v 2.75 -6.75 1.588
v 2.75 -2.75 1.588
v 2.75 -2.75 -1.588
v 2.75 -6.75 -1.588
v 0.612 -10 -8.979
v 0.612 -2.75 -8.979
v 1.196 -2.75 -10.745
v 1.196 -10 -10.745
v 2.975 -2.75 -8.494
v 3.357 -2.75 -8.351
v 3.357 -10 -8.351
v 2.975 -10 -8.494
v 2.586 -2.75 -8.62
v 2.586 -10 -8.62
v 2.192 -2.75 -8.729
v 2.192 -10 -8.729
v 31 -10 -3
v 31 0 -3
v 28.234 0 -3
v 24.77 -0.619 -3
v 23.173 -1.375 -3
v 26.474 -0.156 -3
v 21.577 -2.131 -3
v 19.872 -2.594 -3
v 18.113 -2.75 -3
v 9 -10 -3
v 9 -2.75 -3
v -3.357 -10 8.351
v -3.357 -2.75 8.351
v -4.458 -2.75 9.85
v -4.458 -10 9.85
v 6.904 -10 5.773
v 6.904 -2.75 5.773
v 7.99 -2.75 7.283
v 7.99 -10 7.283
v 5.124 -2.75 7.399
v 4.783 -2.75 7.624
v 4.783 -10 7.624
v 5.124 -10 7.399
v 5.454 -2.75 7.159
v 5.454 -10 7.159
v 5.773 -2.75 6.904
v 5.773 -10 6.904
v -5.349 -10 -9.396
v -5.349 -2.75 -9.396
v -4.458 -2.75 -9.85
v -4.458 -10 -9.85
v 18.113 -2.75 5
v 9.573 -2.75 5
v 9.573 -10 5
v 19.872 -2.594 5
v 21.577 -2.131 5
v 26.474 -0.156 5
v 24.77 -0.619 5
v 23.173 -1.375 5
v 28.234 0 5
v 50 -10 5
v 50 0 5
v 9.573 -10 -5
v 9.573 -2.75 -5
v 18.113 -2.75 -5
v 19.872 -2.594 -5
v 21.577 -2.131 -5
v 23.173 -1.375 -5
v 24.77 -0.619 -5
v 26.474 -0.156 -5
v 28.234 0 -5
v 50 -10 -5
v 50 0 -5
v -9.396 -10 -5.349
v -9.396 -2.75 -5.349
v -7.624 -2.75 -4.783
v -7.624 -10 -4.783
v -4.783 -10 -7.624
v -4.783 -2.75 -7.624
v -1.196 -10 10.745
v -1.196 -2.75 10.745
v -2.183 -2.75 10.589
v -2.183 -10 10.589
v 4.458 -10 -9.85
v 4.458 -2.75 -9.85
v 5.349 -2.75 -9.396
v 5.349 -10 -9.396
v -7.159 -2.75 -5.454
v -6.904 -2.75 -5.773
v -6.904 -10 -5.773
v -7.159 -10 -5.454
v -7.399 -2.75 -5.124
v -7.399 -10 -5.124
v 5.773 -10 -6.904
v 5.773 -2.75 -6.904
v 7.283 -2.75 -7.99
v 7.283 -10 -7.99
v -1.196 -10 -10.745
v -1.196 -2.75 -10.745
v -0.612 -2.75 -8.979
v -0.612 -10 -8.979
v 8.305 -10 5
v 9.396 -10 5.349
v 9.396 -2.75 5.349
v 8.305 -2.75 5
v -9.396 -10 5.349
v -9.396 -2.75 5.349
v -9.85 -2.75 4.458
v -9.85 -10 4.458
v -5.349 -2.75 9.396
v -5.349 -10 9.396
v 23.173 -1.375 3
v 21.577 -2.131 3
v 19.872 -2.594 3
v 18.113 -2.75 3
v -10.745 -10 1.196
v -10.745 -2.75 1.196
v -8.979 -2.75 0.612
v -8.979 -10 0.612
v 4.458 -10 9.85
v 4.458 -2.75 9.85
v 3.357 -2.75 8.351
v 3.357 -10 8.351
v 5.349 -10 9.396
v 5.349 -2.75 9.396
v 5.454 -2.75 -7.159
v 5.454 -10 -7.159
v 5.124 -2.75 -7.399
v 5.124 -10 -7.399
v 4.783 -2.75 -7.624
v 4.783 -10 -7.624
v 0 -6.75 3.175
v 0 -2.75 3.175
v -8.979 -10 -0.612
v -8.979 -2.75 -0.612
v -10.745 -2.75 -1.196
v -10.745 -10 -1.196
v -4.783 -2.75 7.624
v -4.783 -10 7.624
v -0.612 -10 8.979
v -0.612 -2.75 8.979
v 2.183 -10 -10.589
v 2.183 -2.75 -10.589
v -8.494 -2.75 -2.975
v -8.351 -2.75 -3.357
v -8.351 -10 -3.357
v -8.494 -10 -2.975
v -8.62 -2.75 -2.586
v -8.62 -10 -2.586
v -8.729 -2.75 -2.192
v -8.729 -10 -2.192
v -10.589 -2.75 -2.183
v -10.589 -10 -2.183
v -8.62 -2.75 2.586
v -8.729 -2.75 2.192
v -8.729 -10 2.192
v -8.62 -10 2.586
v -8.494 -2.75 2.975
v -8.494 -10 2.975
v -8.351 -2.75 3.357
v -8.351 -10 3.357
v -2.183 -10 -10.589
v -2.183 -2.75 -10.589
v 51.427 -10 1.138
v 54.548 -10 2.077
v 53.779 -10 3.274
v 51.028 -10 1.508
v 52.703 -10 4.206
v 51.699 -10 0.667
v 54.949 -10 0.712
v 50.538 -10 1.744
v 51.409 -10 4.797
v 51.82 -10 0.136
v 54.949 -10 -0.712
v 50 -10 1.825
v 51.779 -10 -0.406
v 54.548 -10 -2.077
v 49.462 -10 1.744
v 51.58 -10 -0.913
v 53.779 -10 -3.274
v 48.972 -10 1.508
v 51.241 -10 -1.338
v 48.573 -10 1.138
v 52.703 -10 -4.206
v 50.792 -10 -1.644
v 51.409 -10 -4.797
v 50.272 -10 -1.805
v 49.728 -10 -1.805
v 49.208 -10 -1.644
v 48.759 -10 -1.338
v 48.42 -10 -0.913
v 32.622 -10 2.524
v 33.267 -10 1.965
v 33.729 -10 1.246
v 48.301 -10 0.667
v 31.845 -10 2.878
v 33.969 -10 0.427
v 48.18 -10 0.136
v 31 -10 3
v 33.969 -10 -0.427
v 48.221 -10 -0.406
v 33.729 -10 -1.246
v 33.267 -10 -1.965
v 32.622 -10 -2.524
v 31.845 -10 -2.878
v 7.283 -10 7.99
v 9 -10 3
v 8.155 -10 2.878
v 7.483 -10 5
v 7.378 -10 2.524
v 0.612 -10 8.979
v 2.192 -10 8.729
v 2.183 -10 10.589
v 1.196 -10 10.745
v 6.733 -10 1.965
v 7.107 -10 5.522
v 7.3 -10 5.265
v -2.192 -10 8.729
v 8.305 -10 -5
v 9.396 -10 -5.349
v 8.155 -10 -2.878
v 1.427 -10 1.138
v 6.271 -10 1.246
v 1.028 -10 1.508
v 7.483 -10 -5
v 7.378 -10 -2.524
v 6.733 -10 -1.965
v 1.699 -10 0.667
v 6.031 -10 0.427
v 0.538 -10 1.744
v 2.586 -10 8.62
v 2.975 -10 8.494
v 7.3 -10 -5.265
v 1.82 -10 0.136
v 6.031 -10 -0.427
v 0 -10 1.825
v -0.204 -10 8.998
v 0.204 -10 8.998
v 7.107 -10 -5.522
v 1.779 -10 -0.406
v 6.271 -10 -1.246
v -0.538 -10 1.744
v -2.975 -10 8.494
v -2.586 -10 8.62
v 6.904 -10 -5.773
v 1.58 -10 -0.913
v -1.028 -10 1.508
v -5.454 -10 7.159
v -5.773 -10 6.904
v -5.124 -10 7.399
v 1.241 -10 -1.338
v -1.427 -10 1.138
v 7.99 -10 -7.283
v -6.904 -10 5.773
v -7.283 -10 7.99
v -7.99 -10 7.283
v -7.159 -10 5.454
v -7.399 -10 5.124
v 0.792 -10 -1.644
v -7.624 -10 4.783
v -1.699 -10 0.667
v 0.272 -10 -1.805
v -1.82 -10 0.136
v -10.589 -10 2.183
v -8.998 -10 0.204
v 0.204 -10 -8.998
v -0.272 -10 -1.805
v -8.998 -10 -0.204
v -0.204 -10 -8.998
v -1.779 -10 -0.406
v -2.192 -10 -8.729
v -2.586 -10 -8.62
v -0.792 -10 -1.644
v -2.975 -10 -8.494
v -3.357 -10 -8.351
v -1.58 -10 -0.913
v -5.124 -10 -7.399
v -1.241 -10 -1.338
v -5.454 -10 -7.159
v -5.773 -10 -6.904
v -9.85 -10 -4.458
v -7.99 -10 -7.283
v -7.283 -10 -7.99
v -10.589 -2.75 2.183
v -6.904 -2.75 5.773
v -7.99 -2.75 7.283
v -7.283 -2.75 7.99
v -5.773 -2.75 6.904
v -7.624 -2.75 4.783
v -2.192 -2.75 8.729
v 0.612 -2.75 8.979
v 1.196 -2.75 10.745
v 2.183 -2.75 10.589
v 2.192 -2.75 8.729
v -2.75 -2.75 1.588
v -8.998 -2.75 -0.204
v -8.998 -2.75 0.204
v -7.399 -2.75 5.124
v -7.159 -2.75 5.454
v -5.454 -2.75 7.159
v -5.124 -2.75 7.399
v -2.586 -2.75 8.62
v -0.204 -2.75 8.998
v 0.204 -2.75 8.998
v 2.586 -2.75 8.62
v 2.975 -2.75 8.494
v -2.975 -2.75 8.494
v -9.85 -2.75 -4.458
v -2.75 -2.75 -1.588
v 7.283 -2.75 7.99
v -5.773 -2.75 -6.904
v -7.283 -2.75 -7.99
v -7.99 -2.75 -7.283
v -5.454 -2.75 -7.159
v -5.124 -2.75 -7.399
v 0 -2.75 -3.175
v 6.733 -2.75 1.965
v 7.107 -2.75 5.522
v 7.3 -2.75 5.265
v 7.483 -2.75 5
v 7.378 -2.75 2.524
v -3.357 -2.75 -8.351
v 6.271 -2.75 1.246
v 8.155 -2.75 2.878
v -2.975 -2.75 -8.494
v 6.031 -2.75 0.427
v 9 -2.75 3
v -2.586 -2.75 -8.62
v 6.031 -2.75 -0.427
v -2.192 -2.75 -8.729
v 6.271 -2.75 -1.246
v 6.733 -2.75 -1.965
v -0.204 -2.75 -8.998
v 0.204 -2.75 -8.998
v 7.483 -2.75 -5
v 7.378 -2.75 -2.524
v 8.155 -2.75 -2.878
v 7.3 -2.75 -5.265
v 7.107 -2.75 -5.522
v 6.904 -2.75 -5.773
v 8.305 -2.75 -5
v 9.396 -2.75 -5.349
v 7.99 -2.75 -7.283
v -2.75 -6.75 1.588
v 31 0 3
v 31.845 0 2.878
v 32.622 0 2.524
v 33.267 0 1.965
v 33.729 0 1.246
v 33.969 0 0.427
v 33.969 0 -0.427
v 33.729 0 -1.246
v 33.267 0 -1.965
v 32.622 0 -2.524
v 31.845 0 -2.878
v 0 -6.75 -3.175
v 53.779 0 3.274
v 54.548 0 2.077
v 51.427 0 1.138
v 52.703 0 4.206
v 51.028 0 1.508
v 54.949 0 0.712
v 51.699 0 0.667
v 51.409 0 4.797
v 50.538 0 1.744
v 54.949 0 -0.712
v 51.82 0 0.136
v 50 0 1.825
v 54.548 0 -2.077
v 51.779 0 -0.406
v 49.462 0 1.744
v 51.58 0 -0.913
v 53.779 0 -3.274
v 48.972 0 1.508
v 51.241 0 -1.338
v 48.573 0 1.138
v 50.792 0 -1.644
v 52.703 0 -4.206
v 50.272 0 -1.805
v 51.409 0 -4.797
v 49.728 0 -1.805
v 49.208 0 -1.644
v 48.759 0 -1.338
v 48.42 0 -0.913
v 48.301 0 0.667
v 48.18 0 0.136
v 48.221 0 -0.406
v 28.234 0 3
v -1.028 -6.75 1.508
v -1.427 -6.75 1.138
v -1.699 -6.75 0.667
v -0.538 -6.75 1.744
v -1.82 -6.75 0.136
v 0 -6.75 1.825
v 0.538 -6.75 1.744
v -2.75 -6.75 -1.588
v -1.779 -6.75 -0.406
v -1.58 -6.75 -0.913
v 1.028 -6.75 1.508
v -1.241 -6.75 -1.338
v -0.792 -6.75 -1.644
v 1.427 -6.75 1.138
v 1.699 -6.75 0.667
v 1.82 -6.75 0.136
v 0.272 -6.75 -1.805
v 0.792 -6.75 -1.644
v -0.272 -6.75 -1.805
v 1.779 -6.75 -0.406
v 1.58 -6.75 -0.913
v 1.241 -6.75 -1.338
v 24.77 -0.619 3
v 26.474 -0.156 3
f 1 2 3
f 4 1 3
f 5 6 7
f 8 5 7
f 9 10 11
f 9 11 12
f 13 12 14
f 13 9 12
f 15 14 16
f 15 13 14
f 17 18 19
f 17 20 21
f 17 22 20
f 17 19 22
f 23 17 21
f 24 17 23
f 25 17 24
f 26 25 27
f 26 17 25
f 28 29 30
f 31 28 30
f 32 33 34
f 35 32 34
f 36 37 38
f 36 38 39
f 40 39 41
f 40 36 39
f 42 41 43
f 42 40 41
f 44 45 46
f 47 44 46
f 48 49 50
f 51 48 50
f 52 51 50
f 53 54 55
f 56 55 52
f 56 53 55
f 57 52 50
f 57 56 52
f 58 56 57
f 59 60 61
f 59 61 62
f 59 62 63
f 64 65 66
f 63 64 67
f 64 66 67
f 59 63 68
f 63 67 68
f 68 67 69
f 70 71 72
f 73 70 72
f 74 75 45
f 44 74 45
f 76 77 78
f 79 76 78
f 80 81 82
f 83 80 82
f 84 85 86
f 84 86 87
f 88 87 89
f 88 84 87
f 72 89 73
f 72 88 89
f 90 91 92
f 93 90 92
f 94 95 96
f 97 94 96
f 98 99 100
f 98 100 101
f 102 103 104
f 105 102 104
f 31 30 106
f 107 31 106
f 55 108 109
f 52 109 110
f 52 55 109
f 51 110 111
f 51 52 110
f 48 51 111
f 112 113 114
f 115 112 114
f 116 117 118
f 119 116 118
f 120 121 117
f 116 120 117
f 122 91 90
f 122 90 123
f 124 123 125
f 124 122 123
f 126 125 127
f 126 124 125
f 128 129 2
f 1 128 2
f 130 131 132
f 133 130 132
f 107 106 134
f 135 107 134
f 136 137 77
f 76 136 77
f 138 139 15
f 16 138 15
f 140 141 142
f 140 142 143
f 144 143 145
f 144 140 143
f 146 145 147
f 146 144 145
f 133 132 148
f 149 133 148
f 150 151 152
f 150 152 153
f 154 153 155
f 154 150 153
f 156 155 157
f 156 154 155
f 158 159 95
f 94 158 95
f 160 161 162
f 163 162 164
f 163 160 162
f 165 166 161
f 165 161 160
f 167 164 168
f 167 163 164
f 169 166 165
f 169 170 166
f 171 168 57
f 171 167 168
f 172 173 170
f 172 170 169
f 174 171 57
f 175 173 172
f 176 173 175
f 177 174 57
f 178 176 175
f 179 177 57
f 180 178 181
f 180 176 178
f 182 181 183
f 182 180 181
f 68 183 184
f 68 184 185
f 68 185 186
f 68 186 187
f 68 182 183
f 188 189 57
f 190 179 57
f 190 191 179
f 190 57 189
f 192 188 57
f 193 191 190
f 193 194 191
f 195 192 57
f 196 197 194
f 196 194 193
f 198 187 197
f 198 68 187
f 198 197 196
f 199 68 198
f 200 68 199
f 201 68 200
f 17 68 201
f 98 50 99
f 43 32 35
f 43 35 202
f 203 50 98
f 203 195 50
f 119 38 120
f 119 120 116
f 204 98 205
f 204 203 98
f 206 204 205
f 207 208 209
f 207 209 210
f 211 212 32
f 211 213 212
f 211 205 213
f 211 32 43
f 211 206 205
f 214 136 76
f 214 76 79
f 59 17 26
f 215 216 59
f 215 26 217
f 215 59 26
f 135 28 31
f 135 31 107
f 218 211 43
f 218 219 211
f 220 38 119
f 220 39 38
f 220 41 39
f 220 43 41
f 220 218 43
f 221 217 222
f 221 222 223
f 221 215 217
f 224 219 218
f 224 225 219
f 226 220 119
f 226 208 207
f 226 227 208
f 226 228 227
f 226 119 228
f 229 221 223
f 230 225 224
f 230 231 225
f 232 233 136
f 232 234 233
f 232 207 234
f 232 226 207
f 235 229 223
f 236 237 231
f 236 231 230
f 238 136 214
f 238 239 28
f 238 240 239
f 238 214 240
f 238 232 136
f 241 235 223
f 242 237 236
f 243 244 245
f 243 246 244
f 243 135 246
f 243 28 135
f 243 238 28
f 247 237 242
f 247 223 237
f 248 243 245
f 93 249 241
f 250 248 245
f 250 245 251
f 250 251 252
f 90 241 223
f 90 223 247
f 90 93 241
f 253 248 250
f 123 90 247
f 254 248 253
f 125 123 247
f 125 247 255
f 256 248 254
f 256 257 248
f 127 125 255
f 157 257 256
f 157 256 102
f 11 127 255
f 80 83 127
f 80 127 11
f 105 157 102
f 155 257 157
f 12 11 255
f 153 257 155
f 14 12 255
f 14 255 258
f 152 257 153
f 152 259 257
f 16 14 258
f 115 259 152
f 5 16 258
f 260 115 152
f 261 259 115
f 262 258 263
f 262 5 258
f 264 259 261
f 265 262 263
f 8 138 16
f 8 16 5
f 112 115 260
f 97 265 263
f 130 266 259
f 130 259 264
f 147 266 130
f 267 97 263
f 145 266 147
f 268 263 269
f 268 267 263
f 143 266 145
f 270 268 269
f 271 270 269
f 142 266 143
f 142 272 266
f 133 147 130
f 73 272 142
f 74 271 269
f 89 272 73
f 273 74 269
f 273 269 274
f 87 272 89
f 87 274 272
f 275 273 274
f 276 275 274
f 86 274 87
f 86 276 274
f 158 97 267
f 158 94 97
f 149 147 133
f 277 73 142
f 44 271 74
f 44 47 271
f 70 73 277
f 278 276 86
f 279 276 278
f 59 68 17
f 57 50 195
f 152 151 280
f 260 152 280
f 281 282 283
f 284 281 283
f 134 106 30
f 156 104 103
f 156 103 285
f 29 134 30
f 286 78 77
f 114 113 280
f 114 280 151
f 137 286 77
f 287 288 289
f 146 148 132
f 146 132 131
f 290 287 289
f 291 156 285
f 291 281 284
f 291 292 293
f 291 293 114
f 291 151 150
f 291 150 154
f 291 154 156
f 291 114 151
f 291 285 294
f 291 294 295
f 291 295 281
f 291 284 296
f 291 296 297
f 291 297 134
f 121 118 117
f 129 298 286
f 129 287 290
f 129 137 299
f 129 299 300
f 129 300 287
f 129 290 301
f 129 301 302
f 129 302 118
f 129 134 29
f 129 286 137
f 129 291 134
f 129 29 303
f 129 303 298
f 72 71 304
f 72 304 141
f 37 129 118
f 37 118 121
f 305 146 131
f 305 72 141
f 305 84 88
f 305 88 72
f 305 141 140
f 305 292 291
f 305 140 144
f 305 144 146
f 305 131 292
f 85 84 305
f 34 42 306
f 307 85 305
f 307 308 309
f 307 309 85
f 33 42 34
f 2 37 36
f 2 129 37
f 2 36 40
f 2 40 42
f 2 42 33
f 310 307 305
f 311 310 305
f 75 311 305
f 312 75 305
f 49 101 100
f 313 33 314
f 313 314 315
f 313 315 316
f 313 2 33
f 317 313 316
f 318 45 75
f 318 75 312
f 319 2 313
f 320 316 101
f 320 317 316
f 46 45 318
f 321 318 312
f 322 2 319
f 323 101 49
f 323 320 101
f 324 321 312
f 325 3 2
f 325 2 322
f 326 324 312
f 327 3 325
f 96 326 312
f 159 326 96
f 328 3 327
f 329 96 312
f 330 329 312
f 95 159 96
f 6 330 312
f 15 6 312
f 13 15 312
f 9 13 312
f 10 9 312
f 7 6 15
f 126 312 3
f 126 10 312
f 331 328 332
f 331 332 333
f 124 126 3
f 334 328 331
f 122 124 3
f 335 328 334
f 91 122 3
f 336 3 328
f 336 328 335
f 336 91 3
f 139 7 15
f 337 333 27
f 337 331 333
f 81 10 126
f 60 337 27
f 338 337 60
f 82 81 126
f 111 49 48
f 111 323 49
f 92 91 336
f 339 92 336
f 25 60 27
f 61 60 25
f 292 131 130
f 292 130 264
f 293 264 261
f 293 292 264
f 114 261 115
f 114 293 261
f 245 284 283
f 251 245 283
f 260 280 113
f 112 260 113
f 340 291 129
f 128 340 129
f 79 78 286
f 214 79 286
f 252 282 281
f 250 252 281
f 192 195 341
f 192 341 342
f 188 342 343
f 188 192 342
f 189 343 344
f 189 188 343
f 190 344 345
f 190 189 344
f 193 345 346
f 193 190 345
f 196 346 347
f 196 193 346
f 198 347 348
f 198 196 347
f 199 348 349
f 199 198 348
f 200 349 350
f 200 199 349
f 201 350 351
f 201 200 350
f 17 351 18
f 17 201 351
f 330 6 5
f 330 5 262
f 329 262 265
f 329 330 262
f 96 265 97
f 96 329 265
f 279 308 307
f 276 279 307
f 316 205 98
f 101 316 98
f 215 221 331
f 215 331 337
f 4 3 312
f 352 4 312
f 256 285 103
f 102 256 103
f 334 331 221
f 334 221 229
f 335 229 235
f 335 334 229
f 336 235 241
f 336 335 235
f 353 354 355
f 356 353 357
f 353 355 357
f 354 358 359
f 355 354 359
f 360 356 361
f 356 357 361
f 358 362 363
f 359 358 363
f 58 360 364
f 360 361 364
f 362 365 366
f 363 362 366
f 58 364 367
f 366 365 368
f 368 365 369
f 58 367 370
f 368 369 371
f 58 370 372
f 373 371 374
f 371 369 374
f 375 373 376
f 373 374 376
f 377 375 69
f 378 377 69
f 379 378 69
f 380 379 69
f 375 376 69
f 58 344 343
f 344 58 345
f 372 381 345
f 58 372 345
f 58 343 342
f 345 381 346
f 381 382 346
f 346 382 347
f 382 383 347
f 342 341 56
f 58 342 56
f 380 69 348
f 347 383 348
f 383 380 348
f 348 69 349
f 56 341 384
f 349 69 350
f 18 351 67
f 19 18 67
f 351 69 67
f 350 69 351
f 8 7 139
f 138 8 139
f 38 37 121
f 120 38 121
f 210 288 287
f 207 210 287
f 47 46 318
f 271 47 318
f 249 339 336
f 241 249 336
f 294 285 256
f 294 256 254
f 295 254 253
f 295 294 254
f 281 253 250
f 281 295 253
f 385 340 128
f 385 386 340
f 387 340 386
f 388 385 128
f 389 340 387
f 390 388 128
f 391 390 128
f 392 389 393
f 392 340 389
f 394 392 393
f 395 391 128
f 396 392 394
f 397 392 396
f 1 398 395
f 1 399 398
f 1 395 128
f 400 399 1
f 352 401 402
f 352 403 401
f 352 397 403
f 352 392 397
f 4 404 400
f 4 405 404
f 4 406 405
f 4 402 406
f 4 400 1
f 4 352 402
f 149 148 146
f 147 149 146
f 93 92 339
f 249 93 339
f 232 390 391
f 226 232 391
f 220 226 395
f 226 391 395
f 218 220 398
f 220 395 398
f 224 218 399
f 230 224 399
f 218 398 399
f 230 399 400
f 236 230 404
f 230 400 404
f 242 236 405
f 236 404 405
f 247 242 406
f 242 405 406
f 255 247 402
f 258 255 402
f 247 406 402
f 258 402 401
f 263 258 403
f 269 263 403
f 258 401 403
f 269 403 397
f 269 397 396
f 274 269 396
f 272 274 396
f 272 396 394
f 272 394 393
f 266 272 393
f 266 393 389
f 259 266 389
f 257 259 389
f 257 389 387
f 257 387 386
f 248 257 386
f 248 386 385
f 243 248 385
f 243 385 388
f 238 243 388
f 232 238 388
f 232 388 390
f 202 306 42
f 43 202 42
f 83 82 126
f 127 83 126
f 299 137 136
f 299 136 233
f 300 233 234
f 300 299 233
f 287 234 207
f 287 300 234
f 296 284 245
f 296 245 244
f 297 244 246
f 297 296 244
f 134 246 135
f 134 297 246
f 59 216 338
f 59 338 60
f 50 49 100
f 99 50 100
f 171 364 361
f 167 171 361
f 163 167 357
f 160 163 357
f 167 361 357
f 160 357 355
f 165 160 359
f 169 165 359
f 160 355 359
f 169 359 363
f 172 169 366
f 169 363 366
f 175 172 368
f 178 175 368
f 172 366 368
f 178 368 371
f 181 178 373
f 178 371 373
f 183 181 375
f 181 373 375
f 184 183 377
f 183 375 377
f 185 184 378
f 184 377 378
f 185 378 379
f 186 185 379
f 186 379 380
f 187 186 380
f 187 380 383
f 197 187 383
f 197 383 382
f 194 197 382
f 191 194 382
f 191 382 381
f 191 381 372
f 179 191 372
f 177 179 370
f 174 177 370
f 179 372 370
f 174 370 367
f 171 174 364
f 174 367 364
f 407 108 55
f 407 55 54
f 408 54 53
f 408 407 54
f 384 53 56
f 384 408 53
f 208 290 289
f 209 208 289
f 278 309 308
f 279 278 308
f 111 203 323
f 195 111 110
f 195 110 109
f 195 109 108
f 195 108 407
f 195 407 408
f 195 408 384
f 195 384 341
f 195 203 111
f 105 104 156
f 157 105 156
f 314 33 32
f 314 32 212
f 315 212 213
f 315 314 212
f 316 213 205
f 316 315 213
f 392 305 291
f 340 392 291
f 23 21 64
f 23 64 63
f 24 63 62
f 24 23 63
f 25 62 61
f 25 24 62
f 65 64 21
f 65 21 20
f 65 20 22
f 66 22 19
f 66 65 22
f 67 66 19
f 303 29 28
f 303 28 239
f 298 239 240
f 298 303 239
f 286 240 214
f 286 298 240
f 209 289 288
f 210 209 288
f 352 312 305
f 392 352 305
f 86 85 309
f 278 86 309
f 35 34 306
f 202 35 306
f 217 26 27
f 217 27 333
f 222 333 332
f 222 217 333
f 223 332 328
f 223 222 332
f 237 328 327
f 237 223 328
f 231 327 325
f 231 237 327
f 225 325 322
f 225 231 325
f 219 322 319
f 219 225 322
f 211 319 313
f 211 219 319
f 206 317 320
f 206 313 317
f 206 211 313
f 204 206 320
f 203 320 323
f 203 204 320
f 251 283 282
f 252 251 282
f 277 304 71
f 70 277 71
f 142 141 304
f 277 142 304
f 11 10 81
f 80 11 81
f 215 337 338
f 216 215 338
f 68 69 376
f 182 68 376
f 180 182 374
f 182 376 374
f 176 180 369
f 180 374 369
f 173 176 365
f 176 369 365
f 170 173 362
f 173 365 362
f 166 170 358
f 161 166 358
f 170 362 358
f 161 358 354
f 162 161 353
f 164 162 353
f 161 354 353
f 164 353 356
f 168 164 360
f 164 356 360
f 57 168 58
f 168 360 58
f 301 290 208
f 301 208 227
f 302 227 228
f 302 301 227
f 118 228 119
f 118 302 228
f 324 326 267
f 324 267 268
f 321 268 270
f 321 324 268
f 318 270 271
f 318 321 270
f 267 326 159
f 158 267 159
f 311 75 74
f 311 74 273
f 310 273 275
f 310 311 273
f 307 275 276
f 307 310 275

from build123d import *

# Parameters (mm, degrees)
SKIZZE1_R                       = 1.825
AUFSATZ_LINEAR_AUSTRAGEN1_DEPTH = 10
SCHNITT_LINEAR_AUSTRAGEN1_DEPTH = 2.75
VERRUNDUNG1_R                   = 10
VERRUNDUNG2_R                   = 10
SKIZZE2_R                       = 9
SKIZZE2_R_2                     = 5
AUFSATZ_LINEAR_AUSTRAGEN2_DEPTH = 7.25
AUFSATZ_LINEAR_AUSTRAGEN3_DEPTH = 7.25
KREISMUSTER1_COUNT              = 20
SCHNITT_LINEAR_AUSTRAGEN3_DEPTH = 4
SCHNITT_LINEAR_AUSTRAGEN4_DEPTH = 57.925042167


with BuildPart() as part:
    # Skizze1 → Aufsatz-Linear austragen1 (new body)
    with BuildSketch(Plane(origin=(0, 0, 0), x_dir=(1, 0, 0), z_dir=(0, 1, 0))):
        with BuildLine():
            Line((0, 5), (50, 5))
            ThreePointArc((50, 5), (55, 0), (50, -5))
            Line((50, -5), (0, -5))
            ThreePointArc((0, -5), (-5, 0), (0, 5))
        make_face()
        with Locations(Location((50, 0, 0), (0, 0, 270))):
            Circle(SKIZZE1_R, mode=Mode.SUBTRACT)
        with Locations(Location((0, 0, 0), (0, 0, 270))):
            Circle(SKIZZE1_R, mode=Mode.SUBTRACT)
    extrude(amount=-AUFSATZ_LINEAR_AUSTRAGEN1_DEPTH)

    # Skizze5 → Schnitt-Linear austragen1 (cut)
    with BuildSketch(Plane(origin=(0, 0, 0), x_dir=(1, 0, 0), z_dir=(0, 1, 0))):
        with BuildLine():
            Line((0, -5), (25, -5))
            Line((25, -5), (25, 5))
            Line((25, 5), (0, 5))
            ThreePointArc((0, 5), (-5, 0), (0, -5))
        make_face()
    extrude(amount=-SCHNITT_LINEAR_AUSTRAGEN1_DEPTH, mode=Mode.SUBTRACT)

    # Verrundung1
    # the kernel refuses this fillet: 10 mm, written as the material it adds along each edge
    with BuildSketch(Plane(origin=(25, -2.75, 5), x_dir=(-1, 0, 0), z_dir=(0, 0, -1))) as verrundung1_piece_1:
        with BuildLine():
            CenterArc((6.887488657, 10), VERRUNDUNG1_R, 226.468847833, 43.531152167)
            Line((0, 2.75), (-0.137749773, 2.605))
            ThreePointArc((-0.137749773, 2.605), (-0.2, 1.375), (-0.2, 0))
            Line((-0.2, 0), (0, -0.2))
            Line((0, -0.2), (6.887488657, -0.2))
            Line((6.887488657, -0.2), (6.887488657, 0))
        make_face()
    extrude(amount=10)

    # Verrundung2
    verrundung2_edges = [part.edges().sort_by_distance(p)[0] for p in [
        (25, 0, 0),
    ]]
    fillet(verrundung2_edges, radius=VERRUNDUNG2_R)

    # Skizze2 → Aufsatz-Linear austragen2 (add)
    with BuildSketch(Plane(origin=(0, -2.75, 0), x_dir=(1, 0, 0), z_dir=(0, 1, 0))):
        Circle(SKIZZE2_R)
        Circle(SKIZZE2_R_2, mode=Mode.SUBTRACT)
    extrude(amount=-AUFSATZ_LINEAR_AUSTRAGEN2_DEPTH)

    # Skizze3 → Aufsatz-Linear austragen3 (add)
    with BuildSketch(Plane(origin=(0, -2.75, 0), x_dir=(1, 0, 0), z_dir=(0, 1, 0))):
        with BuildLine():
            Line((-8.979155186, 0.612186368), (-10.745251311, 1.195648052))
            Line((-10.745251311, 1.195648052), (-10.588816846, 2.183336393))
            Line((-10.588816846, 2.183336393), (-8.728860042, 2.192487713))
            ThreePointArc((-8.728860042, 2.192487713), (-8.889195065, 1.407910185), (-8.979155186, 0.612186368))
        make_face()
    aufsatz_linear_austragen3 = extrude(amount=-AUFSATZ_LINEAR_AUSTRAGEN3_DEPTH)

    # Kreismuster1: Aufsatz-Linear austragen3 ×20 about axis
    kreismuster1_axis = Axis((0, 0, 0), (0, 1, 0))
    for i in range(1, KREISMUSTER1_COUNT):
        add(aufsatz_linear_austragen3.rotate(kreismuster1_axis, i * 360 / KREISMUSTER1_COUNT))

    # Skizze8 → Schnitt-Linear austragen3 (cut)
    with BuildSketch(Plane(origin=(0, -2.75, 0), x_dir=(1, 0, 0), z_dir=(0, 1, 0))):
        Polygon((0, 3.175426481), (-2.75, 1.58771324), (-2.75, -1.58771324), (0, -3.175426481), (2.75, -1.58771324), (2.75, 1.58771324), align=None)
    extrude(amount=-SCHNITT_LINEAR_AUSTRAGEN3_DEPTH, mode=Mode.SUBTRACT)

    # Skizze10 → Schnitt-Linear austragen4 (cut, through all)
    with BuildSketch(Plane.XZ.offset(10)):
        with BuildLine():
            Line((9, 3), (31, 3))
            ThreePointArc((31, 3), (34, 0), (31, -3))
            Line((31, -3), (9, -3))
            ThreePointArc((9, -3), (6, 0), (9, 3))
        make_face()
    extrude(amount=-SCHNITT_LINEAR_AUSTRAGEN4_DEPTH, mode=Mode.SUBTRACT)


solid = part.part
